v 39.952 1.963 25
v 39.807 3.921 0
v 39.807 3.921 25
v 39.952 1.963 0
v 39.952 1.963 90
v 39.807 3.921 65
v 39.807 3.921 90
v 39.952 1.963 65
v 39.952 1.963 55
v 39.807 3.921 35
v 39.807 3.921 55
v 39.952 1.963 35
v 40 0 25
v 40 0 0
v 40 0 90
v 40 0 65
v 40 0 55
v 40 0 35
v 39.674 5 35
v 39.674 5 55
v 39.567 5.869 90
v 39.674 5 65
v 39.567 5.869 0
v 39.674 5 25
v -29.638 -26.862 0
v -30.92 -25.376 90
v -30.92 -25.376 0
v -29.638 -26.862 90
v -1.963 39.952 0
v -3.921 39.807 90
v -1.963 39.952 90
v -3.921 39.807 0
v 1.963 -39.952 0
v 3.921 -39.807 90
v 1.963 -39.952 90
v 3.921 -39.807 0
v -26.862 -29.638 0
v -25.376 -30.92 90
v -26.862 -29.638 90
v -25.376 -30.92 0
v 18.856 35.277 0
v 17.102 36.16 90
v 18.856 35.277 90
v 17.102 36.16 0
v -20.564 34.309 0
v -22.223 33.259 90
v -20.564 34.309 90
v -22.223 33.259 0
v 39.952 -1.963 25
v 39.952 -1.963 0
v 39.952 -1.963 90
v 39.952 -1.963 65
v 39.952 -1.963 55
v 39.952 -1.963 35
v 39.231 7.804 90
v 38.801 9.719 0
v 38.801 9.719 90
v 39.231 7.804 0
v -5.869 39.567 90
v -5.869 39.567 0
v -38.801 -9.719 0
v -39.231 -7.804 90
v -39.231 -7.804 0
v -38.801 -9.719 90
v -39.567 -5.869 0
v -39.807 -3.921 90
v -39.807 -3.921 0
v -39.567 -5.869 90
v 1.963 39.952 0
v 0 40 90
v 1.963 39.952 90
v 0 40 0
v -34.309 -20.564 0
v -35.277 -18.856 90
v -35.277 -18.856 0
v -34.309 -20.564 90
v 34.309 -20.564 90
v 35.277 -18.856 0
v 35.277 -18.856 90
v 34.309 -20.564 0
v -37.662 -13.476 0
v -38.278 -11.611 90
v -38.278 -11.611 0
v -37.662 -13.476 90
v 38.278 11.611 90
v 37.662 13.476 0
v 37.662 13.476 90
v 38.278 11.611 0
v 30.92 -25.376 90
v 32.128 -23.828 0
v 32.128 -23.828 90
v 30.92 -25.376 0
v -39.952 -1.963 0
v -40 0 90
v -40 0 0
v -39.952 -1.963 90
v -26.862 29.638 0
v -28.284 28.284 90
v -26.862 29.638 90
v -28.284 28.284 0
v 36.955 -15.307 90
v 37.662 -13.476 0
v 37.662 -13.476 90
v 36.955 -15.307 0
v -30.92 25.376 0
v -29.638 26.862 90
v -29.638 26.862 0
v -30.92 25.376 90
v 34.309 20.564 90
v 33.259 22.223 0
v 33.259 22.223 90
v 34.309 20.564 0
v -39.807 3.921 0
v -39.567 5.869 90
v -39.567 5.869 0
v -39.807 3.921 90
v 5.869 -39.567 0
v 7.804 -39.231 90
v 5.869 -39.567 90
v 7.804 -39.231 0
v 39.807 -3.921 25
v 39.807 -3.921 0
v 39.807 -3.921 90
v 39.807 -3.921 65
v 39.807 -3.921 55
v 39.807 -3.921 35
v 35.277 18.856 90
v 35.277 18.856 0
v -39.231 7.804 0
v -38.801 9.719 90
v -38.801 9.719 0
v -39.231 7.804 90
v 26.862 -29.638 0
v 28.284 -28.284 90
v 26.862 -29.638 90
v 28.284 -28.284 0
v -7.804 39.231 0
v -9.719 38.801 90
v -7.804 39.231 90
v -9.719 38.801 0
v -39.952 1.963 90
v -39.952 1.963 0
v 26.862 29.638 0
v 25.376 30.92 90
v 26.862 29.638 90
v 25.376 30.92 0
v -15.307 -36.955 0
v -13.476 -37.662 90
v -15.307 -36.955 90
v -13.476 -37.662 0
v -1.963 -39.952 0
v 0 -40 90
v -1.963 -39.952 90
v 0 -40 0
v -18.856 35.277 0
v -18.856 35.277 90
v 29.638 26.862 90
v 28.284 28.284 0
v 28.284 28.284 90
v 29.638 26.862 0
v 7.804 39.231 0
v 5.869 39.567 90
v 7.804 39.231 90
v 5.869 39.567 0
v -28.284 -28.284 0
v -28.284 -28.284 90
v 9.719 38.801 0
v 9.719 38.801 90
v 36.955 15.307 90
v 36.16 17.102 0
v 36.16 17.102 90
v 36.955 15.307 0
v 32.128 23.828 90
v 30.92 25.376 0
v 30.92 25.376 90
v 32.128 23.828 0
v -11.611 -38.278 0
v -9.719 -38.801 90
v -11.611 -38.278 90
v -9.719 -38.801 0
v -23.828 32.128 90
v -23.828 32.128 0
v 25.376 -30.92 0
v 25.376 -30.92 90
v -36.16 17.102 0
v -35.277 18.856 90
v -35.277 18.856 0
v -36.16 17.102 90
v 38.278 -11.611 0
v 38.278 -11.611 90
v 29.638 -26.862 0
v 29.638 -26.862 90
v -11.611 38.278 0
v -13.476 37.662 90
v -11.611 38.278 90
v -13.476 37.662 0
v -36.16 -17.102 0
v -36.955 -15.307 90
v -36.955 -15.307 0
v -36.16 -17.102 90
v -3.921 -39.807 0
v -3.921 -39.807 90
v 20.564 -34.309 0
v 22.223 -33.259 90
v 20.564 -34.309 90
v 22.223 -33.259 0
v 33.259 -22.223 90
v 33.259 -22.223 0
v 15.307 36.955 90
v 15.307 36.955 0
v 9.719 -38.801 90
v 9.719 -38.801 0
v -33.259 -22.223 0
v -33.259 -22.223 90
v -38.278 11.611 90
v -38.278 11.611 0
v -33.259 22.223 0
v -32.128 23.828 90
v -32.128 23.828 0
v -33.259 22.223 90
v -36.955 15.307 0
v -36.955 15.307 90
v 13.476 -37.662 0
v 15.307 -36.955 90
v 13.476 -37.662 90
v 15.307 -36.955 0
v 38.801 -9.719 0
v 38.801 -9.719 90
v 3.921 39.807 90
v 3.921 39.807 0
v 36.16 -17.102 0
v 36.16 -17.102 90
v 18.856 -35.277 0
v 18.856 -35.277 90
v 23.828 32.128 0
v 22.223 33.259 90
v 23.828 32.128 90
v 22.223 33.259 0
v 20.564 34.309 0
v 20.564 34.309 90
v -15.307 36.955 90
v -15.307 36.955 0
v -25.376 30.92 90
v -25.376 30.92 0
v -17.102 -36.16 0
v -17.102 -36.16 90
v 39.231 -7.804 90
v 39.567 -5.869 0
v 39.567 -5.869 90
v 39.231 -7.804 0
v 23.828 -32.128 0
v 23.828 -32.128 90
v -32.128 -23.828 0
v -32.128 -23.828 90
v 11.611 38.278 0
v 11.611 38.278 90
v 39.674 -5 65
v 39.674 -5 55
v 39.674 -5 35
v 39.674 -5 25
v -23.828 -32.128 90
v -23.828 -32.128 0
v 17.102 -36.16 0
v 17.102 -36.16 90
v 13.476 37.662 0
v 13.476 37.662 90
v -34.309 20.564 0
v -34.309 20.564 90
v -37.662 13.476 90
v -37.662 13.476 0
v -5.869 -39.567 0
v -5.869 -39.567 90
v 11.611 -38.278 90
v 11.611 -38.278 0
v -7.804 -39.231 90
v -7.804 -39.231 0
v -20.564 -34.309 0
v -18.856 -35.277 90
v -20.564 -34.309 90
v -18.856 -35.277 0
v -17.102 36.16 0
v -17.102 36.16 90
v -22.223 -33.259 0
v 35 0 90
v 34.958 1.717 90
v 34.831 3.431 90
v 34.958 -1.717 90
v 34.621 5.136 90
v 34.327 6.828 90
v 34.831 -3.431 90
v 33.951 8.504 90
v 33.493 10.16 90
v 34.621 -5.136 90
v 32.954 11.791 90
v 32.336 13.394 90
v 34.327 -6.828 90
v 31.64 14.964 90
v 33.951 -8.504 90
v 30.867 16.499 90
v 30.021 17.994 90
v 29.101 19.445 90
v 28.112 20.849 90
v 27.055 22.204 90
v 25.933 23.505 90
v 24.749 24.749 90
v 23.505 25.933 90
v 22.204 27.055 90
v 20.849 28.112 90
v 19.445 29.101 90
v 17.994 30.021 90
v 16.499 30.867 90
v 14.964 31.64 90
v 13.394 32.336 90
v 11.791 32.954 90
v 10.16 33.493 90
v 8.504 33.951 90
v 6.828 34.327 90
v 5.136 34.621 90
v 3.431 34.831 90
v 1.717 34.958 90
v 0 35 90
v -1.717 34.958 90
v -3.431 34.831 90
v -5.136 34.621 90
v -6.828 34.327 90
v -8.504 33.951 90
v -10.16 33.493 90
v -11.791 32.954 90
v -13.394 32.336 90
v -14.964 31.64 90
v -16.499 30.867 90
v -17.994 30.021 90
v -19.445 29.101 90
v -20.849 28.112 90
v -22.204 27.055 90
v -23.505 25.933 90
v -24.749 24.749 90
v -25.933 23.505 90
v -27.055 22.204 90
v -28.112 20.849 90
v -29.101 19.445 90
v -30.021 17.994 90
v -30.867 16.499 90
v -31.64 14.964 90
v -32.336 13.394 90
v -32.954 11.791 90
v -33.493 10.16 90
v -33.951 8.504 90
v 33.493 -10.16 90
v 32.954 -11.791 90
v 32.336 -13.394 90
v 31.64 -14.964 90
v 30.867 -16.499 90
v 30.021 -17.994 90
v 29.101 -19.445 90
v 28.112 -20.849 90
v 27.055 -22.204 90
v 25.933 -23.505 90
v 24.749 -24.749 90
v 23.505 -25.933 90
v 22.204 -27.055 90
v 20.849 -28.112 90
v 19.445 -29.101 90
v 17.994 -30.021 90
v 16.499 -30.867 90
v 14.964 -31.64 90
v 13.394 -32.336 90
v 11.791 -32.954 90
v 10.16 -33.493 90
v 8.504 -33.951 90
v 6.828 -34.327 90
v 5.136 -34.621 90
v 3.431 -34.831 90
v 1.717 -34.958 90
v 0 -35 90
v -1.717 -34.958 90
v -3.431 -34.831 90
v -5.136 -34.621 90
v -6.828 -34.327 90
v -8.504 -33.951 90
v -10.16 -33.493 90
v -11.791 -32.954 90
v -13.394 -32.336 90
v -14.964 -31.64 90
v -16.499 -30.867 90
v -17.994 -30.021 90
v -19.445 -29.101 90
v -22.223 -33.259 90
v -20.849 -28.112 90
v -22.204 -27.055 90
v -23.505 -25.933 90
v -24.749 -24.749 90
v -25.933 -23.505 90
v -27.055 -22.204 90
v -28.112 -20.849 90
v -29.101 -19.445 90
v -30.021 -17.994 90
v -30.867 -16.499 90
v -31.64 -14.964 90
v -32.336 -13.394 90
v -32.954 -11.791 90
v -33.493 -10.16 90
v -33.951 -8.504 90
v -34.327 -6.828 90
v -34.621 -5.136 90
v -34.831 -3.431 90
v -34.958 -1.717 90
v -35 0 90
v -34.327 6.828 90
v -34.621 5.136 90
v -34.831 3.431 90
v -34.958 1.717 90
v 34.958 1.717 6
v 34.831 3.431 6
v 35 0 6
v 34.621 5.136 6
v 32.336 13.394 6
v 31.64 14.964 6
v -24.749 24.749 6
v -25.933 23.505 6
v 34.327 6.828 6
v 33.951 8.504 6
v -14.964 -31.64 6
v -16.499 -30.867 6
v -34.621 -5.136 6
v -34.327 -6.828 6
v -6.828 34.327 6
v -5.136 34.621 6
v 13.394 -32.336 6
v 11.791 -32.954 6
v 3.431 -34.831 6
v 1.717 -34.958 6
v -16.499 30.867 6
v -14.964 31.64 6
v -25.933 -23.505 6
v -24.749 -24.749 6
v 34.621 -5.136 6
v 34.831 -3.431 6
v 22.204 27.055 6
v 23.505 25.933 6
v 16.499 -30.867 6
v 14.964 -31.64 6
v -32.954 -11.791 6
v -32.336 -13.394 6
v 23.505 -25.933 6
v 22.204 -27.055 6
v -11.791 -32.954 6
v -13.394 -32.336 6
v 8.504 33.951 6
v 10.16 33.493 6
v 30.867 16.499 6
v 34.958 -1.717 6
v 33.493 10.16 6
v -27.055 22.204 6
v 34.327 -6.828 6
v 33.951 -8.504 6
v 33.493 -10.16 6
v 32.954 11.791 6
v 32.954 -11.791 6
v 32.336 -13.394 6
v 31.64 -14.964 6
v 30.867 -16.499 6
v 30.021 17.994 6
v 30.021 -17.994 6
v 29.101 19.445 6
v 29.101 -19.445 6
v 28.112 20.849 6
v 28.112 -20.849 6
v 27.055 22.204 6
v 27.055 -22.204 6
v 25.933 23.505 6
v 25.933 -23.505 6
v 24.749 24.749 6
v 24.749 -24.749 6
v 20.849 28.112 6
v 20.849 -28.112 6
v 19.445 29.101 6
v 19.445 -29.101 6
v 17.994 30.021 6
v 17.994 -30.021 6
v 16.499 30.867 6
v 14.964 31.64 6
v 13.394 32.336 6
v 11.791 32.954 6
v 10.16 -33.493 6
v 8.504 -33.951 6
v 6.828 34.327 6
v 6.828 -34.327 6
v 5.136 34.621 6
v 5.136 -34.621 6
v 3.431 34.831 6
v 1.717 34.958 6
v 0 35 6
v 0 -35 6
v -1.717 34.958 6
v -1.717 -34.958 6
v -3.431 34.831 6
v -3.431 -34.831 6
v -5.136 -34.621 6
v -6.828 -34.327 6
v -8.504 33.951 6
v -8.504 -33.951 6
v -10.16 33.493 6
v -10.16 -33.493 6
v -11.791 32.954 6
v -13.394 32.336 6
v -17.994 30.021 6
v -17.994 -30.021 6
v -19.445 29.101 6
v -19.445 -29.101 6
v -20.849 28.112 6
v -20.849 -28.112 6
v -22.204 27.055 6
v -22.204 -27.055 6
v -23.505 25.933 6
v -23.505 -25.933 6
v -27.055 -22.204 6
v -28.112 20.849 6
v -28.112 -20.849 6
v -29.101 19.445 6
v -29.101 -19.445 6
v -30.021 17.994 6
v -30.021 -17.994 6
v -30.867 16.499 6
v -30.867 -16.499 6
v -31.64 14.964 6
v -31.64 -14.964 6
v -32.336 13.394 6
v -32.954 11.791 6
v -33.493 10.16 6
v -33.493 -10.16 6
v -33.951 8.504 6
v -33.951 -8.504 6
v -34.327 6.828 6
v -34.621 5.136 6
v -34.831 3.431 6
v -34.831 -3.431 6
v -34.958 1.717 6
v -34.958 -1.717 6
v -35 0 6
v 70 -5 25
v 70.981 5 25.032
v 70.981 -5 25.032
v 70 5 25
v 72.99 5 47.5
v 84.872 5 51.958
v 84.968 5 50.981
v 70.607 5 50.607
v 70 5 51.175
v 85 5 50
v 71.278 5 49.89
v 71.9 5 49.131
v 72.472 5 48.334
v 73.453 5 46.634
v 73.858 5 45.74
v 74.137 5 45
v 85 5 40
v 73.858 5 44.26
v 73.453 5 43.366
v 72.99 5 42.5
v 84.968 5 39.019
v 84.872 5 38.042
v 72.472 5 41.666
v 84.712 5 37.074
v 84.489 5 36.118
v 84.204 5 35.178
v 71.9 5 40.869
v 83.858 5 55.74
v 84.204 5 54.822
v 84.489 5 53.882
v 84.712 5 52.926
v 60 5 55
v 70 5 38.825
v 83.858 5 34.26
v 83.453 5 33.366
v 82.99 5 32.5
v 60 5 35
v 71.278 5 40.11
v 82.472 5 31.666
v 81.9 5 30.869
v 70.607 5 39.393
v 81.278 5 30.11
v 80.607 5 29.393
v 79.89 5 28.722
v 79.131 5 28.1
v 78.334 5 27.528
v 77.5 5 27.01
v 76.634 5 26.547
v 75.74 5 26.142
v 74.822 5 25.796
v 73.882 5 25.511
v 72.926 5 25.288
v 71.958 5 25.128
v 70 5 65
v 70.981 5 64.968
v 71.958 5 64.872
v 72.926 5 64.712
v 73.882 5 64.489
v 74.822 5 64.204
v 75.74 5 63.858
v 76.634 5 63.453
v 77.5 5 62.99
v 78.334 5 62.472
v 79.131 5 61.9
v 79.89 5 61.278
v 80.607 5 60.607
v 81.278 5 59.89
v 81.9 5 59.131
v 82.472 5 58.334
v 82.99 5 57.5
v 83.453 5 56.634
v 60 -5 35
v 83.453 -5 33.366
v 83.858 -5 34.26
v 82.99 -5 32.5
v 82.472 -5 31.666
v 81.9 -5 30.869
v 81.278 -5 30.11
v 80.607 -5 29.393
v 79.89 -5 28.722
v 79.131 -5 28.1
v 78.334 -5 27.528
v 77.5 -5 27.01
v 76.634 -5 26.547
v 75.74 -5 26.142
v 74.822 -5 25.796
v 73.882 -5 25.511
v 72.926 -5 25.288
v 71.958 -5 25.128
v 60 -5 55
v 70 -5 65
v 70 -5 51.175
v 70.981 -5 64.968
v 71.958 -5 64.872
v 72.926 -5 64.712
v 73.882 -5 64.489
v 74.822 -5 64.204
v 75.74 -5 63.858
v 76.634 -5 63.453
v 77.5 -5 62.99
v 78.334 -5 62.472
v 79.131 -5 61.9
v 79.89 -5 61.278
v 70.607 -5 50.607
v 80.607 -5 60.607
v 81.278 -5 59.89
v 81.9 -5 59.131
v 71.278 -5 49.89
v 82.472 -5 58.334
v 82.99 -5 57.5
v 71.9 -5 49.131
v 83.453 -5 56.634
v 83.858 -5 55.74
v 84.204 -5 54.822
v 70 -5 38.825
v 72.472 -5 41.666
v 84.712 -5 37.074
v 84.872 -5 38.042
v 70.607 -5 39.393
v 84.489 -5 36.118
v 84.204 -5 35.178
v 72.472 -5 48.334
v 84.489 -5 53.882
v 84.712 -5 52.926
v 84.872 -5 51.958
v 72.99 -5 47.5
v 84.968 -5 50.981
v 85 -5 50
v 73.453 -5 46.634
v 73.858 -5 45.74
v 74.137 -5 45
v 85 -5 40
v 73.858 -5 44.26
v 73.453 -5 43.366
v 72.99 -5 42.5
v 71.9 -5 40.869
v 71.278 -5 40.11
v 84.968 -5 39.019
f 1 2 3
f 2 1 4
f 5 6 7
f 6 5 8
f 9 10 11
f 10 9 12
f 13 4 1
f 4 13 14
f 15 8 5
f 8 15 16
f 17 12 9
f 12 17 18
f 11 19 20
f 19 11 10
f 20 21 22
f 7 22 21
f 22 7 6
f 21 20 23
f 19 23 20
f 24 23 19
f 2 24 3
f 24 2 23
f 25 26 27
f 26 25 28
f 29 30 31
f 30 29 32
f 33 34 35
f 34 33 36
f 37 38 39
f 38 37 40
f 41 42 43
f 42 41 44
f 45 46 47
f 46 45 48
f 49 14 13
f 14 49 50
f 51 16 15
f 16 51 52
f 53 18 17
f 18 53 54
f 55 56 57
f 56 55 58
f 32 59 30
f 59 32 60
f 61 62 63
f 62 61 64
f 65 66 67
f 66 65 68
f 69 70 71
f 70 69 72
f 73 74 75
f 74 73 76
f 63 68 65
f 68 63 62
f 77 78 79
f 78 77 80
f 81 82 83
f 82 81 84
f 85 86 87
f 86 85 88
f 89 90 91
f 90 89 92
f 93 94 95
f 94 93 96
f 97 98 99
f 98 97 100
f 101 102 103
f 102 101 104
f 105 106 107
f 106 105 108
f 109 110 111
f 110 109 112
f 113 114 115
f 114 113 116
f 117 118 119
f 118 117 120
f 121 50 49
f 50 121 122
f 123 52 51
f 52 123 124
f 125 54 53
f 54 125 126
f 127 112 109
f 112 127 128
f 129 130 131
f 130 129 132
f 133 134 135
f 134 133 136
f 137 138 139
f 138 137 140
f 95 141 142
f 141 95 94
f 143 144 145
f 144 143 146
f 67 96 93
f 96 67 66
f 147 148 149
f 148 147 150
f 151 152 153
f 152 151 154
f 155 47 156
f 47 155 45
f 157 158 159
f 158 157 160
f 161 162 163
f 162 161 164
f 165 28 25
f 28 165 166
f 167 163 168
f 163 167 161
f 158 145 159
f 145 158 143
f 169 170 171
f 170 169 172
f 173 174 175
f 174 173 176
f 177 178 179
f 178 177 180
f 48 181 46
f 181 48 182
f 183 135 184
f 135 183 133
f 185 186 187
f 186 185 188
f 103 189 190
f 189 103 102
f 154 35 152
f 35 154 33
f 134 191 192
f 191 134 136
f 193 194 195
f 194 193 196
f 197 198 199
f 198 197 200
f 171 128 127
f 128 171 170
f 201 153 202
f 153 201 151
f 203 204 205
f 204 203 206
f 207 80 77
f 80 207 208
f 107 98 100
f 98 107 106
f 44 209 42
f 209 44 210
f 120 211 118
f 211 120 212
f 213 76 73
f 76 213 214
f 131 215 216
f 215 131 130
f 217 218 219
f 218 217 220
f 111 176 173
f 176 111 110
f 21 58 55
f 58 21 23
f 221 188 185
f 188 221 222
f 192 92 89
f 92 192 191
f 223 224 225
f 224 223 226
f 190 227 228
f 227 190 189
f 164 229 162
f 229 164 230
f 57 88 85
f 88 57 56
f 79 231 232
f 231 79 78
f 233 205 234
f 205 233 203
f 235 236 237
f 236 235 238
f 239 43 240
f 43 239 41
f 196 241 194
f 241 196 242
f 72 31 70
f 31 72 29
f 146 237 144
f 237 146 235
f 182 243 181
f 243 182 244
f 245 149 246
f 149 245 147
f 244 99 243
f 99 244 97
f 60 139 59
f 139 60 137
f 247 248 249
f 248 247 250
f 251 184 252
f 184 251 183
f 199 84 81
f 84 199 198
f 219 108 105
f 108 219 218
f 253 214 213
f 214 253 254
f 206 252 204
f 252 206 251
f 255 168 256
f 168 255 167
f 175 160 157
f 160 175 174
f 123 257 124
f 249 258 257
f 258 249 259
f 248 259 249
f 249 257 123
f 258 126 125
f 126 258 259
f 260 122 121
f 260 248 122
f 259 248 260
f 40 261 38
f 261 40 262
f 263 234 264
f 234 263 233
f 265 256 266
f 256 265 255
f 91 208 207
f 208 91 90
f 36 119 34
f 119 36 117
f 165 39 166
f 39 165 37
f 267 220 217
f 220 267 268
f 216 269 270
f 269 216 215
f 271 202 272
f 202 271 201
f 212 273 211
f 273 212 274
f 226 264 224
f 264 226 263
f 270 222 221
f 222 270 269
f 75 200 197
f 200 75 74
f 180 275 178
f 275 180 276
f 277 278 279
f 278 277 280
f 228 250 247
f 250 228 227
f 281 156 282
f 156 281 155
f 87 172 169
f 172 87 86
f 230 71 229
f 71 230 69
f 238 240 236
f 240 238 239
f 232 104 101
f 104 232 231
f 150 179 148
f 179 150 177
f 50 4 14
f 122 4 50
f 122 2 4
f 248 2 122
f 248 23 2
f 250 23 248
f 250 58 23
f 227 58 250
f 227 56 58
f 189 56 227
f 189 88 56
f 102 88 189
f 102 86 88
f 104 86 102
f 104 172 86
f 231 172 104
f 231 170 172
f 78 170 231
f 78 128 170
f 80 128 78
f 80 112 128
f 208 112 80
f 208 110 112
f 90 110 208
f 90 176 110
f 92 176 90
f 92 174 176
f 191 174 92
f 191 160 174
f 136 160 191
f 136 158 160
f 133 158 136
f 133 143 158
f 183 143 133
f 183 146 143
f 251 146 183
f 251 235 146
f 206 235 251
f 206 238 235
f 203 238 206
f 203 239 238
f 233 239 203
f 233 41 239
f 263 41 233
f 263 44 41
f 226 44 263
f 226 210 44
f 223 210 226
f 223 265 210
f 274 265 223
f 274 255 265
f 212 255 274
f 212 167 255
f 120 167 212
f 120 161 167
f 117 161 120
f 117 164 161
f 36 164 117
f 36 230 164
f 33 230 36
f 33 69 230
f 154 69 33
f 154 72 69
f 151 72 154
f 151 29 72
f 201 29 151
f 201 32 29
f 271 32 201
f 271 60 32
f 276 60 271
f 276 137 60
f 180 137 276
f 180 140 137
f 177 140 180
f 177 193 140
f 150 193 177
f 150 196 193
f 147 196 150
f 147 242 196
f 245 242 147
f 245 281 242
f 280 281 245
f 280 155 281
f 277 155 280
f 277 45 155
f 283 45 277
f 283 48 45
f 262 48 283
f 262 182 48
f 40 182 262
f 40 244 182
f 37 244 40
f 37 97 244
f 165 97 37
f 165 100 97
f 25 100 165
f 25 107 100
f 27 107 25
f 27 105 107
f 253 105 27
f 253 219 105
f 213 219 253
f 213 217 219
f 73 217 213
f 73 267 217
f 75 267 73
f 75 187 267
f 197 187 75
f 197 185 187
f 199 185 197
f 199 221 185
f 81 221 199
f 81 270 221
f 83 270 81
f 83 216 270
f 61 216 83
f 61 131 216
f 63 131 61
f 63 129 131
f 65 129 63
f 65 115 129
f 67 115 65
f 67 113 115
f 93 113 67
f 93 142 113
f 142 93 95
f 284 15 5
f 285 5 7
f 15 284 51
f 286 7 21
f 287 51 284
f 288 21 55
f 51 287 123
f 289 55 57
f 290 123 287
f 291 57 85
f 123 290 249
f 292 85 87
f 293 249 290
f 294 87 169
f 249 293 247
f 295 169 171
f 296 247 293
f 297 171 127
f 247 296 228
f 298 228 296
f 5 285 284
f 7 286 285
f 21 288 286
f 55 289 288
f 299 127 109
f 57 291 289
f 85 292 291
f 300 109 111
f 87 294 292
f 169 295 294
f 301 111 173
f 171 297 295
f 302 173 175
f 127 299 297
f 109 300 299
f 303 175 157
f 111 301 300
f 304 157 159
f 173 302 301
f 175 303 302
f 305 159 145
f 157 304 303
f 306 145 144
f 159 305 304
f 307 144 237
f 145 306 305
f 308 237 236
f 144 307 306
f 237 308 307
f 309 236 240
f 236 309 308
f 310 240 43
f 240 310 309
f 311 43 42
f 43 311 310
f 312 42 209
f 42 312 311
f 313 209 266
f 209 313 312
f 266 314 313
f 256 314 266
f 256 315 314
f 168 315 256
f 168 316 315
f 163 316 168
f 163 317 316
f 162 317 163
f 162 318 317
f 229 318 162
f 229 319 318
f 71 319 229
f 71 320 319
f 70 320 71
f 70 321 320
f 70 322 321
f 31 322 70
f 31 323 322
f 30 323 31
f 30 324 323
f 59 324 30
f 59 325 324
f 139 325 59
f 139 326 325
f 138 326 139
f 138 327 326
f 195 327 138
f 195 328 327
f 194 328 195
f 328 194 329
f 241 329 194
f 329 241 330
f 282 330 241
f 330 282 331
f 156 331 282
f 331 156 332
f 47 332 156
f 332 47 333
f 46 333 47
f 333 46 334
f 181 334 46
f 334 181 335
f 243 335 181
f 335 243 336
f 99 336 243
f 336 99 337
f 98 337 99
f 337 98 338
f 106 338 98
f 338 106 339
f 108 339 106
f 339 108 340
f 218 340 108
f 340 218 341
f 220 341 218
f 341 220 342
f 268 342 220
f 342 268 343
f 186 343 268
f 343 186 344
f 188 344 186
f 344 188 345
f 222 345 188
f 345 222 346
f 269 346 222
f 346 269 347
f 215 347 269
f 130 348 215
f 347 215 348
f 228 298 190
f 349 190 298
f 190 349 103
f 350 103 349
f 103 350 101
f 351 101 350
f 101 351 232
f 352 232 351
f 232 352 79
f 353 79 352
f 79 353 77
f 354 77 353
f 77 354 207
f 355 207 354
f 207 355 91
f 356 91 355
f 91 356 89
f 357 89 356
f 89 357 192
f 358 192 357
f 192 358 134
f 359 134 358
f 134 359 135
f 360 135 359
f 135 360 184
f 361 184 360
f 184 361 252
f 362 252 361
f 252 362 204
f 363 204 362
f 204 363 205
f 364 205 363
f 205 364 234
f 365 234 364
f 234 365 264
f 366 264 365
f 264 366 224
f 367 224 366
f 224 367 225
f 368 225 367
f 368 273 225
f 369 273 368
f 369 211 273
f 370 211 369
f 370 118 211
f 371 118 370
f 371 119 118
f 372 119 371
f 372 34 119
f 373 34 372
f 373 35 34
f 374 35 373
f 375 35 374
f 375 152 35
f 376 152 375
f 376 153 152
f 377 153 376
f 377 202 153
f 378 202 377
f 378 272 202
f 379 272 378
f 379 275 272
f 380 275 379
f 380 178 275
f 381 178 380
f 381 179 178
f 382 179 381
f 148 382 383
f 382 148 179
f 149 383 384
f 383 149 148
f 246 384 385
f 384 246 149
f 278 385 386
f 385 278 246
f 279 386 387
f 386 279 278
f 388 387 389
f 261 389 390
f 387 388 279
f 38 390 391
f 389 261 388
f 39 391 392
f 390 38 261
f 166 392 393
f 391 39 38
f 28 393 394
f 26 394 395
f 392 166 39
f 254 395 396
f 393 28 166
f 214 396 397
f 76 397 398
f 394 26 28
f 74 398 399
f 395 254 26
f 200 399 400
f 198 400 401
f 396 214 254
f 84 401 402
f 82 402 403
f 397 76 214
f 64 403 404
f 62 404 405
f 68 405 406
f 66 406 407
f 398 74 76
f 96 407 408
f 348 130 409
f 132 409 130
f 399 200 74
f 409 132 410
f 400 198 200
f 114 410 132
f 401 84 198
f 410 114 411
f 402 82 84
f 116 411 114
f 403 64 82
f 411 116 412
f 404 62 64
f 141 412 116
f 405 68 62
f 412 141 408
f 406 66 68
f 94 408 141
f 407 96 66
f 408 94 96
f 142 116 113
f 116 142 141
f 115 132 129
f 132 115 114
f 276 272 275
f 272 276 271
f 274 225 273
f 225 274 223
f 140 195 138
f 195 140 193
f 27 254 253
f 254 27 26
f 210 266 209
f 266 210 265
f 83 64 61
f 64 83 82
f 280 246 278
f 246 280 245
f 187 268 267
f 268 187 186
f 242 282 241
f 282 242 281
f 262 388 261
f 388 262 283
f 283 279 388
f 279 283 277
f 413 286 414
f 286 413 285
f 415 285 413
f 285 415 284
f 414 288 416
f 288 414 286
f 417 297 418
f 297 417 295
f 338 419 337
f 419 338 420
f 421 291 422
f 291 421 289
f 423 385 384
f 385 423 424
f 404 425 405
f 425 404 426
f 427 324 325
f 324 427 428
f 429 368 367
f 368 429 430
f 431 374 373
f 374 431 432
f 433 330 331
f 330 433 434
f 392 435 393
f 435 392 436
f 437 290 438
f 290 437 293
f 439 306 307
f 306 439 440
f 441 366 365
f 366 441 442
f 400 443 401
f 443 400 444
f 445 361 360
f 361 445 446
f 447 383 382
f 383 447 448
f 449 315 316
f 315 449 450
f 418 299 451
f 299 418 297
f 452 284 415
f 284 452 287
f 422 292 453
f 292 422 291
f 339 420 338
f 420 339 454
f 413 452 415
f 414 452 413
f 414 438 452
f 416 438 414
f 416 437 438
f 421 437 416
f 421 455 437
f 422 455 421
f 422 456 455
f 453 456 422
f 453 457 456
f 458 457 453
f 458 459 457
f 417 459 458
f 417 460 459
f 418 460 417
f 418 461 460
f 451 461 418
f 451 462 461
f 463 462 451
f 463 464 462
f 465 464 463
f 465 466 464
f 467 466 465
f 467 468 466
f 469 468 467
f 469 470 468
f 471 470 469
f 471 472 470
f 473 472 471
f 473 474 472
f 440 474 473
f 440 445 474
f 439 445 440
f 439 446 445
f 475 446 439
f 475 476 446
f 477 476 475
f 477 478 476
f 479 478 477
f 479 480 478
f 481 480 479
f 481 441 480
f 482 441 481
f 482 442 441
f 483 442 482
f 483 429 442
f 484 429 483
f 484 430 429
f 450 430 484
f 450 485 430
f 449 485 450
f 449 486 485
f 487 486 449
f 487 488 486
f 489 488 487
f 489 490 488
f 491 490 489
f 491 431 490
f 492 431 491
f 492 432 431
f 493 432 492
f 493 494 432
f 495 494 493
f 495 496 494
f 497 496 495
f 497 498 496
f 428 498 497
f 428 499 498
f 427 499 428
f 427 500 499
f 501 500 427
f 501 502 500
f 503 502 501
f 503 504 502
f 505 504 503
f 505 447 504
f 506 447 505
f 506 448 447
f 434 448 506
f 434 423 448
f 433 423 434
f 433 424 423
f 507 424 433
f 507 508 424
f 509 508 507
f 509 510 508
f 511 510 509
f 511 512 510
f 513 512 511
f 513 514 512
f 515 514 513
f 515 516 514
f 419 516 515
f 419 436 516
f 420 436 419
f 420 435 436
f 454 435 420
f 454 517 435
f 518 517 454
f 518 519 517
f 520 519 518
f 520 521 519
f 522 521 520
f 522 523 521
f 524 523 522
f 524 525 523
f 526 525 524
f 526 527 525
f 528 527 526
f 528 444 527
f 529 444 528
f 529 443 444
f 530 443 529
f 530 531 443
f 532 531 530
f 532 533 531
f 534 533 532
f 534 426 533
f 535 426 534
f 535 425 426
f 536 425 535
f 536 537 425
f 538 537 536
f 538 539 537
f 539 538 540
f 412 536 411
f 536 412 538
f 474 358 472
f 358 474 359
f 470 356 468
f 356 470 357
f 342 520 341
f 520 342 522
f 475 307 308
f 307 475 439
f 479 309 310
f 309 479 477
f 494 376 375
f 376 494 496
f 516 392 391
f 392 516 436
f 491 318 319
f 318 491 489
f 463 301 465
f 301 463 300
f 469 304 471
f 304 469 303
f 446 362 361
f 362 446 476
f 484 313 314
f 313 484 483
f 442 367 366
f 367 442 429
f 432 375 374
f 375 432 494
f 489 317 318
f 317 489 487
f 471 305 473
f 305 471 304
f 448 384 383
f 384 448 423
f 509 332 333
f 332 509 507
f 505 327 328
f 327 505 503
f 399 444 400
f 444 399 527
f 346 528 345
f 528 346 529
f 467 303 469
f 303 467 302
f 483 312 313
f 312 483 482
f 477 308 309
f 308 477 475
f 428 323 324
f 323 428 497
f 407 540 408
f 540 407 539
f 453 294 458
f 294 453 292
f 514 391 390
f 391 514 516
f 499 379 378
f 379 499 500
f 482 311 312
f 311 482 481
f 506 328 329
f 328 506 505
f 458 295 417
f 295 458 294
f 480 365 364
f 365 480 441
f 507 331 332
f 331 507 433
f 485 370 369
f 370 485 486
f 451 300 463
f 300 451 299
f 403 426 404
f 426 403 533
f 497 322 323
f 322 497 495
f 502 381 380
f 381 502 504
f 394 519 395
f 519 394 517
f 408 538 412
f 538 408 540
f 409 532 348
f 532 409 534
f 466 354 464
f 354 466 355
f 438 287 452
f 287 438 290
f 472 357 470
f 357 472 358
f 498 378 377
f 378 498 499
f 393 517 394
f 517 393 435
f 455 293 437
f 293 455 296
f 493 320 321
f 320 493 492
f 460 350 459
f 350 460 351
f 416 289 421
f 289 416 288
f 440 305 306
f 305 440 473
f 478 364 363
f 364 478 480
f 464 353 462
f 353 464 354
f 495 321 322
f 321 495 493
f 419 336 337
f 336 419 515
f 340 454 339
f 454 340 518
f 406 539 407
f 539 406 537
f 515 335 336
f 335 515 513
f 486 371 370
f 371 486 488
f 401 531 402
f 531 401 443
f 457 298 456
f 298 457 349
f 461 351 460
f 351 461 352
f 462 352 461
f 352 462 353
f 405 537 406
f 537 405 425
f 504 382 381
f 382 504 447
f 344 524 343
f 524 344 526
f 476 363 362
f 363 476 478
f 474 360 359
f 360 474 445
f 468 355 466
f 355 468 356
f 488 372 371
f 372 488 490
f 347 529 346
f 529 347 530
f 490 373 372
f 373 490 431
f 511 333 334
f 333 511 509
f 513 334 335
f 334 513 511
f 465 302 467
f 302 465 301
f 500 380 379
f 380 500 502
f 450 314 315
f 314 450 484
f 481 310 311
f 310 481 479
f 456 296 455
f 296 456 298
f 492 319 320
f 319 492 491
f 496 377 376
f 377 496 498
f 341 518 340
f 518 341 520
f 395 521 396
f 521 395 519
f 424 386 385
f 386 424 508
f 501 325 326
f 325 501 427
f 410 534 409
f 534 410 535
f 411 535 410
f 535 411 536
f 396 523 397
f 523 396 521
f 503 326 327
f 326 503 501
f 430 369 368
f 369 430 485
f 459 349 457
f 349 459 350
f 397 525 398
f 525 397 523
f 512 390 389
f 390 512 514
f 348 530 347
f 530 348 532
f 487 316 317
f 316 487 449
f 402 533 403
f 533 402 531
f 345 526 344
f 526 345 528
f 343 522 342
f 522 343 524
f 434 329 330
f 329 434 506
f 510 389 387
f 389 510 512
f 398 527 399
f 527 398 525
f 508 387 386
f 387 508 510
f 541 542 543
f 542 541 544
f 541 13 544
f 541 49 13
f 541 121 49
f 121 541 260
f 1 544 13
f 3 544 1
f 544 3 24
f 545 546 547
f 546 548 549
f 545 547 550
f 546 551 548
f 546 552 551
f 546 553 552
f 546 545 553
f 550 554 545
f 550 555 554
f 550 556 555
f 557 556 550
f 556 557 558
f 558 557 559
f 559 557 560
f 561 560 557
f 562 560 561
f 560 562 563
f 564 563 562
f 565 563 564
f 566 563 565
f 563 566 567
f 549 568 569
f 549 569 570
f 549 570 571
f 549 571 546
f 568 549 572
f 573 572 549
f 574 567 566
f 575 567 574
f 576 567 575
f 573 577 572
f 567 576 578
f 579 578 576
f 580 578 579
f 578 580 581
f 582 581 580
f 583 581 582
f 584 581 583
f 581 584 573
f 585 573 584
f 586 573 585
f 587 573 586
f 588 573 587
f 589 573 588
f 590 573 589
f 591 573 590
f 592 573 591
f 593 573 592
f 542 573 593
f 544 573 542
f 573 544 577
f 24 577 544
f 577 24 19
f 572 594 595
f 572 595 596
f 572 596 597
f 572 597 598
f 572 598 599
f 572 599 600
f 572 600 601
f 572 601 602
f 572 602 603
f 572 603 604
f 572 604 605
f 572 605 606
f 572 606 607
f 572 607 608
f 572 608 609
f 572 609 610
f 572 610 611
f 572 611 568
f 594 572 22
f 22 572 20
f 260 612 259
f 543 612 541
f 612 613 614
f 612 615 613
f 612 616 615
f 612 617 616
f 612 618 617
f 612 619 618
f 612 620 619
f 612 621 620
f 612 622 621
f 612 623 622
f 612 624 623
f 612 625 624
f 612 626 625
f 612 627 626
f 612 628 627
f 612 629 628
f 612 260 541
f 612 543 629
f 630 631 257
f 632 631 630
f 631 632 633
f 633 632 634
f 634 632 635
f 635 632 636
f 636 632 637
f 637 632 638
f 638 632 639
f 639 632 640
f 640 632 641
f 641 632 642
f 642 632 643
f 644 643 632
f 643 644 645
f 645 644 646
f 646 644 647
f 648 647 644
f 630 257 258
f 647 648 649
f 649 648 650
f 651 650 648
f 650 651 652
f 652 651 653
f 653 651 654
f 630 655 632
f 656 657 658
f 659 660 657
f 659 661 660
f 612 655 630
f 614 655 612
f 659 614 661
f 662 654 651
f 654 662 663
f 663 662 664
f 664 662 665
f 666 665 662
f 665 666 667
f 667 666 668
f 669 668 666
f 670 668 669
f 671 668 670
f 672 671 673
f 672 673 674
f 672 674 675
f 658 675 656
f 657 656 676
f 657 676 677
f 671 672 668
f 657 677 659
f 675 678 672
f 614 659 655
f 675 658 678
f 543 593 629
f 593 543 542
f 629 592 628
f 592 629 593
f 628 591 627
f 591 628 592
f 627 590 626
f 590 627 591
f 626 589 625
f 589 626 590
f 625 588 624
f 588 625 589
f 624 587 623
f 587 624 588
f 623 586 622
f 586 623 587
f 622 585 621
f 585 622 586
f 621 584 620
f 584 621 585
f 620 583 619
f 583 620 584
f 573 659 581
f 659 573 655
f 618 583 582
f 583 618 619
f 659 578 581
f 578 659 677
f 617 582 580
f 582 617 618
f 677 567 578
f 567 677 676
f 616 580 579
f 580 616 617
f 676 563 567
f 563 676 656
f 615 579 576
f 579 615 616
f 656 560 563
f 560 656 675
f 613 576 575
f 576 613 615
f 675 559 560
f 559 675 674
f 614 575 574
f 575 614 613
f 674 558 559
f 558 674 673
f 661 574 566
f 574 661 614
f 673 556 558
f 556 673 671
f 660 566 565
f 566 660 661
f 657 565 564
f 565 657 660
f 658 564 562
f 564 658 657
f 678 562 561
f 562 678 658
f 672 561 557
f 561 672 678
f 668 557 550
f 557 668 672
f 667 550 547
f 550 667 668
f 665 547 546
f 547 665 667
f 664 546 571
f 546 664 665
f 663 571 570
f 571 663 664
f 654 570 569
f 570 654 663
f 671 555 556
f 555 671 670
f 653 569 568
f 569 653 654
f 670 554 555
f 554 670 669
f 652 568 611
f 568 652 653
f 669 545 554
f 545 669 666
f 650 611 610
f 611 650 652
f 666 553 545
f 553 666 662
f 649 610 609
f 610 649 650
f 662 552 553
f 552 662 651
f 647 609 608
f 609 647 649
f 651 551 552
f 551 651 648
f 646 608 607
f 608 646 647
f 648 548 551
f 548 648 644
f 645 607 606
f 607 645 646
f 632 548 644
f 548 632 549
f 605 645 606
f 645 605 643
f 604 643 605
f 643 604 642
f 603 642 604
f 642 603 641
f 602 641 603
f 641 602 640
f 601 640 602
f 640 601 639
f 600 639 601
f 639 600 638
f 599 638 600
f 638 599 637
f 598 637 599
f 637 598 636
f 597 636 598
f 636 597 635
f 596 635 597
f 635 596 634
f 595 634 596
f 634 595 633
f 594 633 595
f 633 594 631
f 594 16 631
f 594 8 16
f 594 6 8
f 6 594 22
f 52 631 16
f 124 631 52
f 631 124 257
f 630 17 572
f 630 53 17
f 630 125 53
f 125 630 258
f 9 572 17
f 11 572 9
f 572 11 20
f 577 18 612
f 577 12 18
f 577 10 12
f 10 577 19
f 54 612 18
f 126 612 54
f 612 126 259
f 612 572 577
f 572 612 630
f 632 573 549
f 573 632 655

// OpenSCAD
$fn = 128;

outer_r  = 40;
inner_r  = 35;
mug_h    = 90;
bot_t    = 6;

handle_z   = mug_h / 2;   // 高さ方向中央 = 45mm
h_space_h  = 30;          // 取手内側空間 高さ
h_space_w  = 25;          // 取手内側空間 幅
handle_t   = 10;          // 取手断面の太さ

// 各部寸法
// バーはX軸方向に伸びる。本体に食い込んで確実結合
bar_x_start = outer_r - 3;
bar_x_end   = outer_r + h_space_w;         // バー外端X
bar_x_len   = bar_x_end - bar_x_start;

bar_z_top   = handle_z + h_space_h / 2;   // = 60
bar_z_bot   = handle_z - h_space_h / 2;   // = 30

// 半円アーム中心: (bar_x_end, handle_z)
// 半円の回転半径 (中心線ベース) = h_space_h/2 = 15
arc_cx = bar_x_end;
arc_cz = handle_z;
arc_r  = h_space_h / 2;  // = 15

// 上バー: Z中心 = bar_z_top, 断面 handle_t x handle_t
module top_bar() {
    translate([bar_x_start, -handle_t/2, bar_z_top - handle_t/2])
        cube([bar_x_len, handle_t, handle_t]);
}

// 下バー
module bot_bar() {
    translate([bar_x_start, -handle_t/2, bar_z_bot - handle_t/2])
        cube([bar_x_len, handle_t, handle_t]);
}

// 半円アーム: XZ平面内で -90°〜+90° の半円
// 各セグメントを hull() で繋ぐ
// 断面: handle_t x handle_t の立方体
module arc_arm() {
    N = 48;
    for (i = [0 : N-1]) {
        a1 = -90 + 180 *  i      / N;
        a2 = -90 + 180 * (i+1)   / N;
        x1 = arc_cx + arc_r * cos(a1);
        z1 = arc_cz + arc_r * sin(a1);
        x2 = arc_cx + arc_r * cos(a2);
        z2 = arc_cz + arc_r * sin(a2);
        hull() {
            translate([x1 - handle_t/2, -handle_t/2, z1 - handle_t/2])
                cube([handle_t, handle_t, handle_t]);
            translate([x2 - handle_t/2, -handle_t/2, z2 - handle_t/2])
                cube([handle_t, handle_t, handle_t]);
        }
    }
}

// バーと半円を滑らかに繋ぐジョイント
module top_joint() {
    x1 = arc_cx + arc_r * cos(-90);
    z1 = arc_cz + arc_r * sin(-90);
    hull() {
        translate([bar_x_end - handle_t/2, -handle_t/2, bar_z_top - handle_t/2])
            cube([handle_t, handle_t, handle_t]);
        translate([x1 - handle_t/2, -handle_t/2, z1 - handle_t/2])
            cube([handle_t, handle_t, handle_t]);
    }
}

module bot_joint() {
    x1 = arc_cx + arc_r * cos(90);
    z1 = arc_cz + arc_r * sin(90);
    hull() {
        translate([bar_x_end - handle_t/2, -handle_t/2, bar_z_bot - handle_t/2])
            cube([handle_t, handle_t, handle_t]);
        translate([x1 - handle_t/2, -handle_t/2, z1 - handle_t/2])
            cube([handle_t, handle_t, handle_t]);
    }
}

module handle() {
    union() {
        top_bar();
        bot_bar();
        arc_arm();
        top_joint();
        bot_joint();
    }
}

module mug_body() {
    difference() {
        cylinder(r = outer_r, h = mug_h);
        translate([0, 0, bot_t])
            cylinder(r = inner_r, h = mug_h - bot_t + 0.1);
    }
}

union() {
    mug_body();
    handle();
}
